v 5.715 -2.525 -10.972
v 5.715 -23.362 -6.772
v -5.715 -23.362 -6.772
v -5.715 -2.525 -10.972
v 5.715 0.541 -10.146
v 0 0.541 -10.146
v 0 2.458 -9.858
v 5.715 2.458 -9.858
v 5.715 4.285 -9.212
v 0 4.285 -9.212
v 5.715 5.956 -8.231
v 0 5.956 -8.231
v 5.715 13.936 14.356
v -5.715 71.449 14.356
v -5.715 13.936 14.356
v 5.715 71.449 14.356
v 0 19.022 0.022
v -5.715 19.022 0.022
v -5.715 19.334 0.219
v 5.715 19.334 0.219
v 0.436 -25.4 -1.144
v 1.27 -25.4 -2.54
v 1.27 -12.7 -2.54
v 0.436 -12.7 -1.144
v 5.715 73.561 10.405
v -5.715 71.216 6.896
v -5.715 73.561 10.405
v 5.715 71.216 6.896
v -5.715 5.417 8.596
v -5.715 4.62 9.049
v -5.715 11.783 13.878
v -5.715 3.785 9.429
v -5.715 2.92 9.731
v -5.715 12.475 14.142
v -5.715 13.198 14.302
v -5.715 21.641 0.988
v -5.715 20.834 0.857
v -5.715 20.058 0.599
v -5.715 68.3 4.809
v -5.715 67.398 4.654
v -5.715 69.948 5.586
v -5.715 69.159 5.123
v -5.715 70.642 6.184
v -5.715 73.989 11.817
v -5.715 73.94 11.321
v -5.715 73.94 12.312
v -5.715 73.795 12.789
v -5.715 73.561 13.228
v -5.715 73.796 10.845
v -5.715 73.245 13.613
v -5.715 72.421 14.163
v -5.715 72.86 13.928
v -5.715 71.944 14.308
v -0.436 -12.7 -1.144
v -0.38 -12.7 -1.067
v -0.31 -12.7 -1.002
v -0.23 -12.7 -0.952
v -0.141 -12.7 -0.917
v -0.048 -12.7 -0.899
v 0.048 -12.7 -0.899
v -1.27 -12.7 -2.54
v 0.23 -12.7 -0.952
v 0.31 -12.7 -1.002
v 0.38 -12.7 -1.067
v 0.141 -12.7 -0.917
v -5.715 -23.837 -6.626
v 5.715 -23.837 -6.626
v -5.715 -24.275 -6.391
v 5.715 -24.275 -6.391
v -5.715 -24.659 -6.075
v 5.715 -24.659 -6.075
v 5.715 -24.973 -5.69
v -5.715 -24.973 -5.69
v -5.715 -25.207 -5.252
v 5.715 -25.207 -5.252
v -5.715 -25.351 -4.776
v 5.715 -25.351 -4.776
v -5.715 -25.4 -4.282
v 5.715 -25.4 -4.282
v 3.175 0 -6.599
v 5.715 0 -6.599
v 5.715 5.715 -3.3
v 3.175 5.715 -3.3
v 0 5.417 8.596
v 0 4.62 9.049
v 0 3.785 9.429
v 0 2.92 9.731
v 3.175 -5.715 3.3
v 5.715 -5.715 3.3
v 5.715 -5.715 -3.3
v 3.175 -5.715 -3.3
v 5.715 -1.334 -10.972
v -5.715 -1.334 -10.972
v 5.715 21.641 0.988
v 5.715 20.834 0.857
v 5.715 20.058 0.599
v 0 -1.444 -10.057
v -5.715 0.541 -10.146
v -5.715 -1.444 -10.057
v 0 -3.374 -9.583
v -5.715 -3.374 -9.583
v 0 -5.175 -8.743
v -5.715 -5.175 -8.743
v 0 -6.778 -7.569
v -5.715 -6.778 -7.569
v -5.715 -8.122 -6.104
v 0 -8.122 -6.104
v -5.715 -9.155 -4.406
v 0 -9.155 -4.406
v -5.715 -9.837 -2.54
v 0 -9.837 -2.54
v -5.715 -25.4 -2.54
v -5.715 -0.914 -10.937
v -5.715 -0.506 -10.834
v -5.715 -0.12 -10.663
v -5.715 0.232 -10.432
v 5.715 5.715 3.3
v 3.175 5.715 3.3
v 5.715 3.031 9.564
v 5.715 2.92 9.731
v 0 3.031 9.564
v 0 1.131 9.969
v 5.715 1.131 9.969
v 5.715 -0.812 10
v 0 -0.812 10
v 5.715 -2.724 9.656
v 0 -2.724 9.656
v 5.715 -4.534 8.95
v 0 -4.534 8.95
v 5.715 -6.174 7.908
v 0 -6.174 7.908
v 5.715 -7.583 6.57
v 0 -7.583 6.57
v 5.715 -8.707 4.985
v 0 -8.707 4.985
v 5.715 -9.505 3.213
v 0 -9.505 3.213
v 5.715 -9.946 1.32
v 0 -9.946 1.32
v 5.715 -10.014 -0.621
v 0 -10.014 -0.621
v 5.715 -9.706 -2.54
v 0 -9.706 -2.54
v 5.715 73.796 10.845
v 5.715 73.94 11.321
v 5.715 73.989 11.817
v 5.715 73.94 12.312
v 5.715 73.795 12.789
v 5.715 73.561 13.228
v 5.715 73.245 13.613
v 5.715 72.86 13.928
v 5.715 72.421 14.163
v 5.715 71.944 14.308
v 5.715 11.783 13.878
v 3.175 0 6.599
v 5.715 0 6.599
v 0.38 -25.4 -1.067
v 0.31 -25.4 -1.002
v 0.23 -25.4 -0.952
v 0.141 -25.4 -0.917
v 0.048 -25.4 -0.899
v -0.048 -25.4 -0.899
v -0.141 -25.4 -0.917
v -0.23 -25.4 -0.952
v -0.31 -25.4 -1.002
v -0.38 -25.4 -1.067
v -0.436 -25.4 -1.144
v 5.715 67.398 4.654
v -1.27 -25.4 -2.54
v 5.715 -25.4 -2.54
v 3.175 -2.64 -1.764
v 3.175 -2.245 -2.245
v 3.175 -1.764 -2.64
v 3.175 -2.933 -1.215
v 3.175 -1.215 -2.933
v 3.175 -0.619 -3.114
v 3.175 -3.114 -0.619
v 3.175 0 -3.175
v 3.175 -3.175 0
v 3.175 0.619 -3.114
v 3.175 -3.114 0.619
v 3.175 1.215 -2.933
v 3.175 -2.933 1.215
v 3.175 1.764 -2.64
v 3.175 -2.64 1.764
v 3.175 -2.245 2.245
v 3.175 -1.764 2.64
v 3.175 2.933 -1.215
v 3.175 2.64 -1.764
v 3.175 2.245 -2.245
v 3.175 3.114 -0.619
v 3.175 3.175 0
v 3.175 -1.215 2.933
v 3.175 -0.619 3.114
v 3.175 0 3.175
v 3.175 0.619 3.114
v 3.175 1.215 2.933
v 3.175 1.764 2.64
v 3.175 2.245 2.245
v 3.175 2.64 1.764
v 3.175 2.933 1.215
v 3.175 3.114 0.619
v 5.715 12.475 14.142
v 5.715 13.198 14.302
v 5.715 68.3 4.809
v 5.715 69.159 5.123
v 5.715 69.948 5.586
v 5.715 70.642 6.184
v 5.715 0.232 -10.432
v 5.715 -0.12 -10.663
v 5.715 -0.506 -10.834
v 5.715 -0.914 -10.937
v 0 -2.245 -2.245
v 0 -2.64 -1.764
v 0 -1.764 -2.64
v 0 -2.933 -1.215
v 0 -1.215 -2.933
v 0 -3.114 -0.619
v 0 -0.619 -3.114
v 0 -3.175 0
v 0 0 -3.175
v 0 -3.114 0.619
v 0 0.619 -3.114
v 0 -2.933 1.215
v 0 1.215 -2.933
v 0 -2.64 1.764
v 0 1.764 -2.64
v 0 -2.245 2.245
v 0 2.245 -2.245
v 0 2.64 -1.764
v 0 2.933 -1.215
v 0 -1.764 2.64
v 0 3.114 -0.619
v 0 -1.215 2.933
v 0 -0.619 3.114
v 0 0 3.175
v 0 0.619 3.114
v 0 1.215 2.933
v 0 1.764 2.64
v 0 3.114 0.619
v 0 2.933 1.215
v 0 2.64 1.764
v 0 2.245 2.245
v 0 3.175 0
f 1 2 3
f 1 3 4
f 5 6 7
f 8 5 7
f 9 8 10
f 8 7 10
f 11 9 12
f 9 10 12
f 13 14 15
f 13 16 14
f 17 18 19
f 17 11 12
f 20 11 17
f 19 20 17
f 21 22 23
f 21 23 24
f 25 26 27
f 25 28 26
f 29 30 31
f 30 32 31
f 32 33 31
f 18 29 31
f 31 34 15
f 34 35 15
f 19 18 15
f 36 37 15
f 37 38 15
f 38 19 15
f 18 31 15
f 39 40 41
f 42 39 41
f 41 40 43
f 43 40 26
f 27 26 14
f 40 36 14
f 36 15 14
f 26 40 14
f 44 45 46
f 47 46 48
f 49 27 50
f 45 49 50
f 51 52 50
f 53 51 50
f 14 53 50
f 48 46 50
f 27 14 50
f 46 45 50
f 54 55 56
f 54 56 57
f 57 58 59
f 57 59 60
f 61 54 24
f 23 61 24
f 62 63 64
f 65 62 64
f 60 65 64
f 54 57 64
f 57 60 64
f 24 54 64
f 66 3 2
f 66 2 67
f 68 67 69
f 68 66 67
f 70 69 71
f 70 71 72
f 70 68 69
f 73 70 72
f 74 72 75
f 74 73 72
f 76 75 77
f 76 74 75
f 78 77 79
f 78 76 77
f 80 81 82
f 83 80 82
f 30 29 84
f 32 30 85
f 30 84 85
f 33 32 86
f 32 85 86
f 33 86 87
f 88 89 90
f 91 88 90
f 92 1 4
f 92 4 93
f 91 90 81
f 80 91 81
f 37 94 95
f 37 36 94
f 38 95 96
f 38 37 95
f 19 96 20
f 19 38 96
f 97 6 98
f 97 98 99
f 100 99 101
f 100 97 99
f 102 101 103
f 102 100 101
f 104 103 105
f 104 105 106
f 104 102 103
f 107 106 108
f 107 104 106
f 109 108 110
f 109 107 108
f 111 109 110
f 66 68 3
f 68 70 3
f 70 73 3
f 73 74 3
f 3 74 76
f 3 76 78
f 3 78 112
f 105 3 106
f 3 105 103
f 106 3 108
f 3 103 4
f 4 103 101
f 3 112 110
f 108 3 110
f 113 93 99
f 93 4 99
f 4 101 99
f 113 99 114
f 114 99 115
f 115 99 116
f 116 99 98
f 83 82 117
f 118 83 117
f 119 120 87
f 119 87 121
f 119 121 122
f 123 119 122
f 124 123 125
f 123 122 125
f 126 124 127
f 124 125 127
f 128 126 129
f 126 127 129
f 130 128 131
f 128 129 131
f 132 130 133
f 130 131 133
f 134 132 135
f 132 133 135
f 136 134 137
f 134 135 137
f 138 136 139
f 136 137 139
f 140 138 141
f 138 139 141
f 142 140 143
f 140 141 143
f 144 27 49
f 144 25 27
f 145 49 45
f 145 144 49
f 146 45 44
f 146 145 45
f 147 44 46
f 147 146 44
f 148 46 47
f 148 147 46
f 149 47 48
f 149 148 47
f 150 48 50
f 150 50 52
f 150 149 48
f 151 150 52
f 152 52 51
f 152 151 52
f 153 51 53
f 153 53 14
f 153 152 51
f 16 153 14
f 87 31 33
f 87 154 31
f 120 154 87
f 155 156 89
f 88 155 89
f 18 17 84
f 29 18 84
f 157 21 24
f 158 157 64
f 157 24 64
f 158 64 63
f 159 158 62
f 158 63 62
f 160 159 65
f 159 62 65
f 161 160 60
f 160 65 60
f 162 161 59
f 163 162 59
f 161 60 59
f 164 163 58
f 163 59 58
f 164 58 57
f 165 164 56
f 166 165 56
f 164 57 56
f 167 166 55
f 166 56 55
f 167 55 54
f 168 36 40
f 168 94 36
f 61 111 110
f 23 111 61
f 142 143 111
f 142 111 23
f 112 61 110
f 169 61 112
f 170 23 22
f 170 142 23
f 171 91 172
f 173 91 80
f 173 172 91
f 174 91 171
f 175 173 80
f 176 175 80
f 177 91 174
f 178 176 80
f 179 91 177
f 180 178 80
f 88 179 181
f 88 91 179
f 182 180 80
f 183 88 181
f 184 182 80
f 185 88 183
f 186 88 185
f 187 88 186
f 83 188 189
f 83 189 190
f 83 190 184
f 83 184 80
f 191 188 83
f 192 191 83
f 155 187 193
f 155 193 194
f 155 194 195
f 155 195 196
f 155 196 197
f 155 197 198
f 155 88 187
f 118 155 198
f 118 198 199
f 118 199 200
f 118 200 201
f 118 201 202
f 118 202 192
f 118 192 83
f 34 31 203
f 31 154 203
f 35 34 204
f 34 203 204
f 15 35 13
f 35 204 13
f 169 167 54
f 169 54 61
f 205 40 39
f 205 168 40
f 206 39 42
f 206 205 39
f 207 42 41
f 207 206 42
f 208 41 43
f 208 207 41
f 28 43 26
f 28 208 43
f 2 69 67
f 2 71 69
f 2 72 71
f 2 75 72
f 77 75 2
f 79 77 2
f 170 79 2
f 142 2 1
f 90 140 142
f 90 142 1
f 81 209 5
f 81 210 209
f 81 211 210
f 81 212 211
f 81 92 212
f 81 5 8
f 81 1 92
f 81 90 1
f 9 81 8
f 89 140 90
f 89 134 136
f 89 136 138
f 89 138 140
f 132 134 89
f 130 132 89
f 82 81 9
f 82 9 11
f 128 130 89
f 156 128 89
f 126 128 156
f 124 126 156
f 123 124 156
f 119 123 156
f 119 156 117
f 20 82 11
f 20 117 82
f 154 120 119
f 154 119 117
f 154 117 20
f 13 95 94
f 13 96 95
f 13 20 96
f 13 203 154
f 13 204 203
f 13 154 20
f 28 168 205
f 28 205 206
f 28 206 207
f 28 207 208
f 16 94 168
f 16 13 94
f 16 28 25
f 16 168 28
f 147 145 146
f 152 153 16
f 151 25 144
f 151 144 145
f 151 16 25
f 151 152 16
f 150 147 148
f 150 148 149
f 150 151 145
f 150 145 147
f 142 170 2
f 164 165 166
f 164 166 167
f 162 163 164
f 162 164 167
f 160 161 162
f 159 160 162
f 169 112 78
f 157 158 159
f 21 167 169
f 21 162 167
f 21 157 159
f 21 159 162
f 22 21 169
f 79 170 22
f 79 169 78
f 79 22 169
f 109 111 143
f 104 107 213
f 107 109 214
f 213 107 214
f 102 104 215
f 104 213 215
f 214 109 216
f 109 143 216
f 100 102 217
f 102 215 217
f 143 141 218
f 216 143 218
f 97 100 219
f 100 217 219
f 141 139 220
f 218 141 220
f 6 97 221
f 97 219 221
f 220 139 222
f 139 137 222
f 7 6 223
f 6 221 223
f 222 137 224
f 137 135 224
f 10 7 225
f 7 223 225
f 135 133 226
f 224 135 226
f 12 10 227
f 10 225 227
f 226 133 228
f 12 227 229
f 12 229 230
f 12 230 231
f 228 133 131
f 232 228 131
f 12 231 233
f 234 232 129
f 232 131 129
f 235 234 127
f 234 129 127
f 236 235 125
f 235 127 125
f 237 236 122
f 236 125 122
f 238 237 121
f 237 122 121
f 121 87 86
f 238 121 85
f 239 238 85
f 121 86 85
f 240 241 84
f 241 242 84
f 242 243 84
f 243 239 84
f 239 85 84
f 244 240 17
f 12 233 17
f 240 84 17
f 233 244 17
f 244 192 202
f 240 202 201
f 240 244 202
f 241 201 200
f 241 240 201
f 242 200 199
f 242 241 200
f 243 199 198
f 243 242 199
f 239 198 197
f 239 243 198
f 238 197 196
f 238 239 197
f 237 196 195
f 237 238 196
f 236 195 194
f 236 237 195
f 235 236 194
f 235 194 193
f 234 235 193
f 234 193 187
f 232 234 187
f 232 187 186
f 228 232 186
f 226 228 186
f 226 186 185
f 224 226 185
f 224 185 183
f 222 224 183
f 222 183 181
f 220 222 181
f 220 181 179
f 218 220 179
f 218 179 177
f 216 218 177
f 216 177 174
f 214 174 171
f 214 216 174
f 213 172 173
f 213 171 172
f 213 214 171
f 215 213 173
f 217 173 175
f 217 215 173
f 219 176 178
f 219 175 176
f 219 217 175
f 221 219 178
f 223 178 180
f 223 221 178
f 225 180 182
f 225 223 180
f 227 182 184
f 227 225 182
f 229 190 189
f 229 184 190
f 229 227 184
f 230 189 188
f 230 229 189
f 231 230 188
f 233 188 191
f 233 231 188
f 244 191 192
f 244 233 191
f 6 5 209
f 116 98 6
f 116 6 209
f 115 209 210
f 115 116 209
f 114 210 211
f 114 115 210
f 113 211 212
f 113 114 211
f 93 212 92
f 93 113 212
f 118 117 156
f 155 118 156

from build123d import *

# Parameters (mm, degrees)
F2_DEPTH     = 5.715
F3_R         = 5.08
F4_R         = 2.54
F0_R         = 3.175
F5_DEPTH     = 5.715
F7_DEPTH     = 25.4
F9_DEPTH     = 5.715
F10_T1_DEPTH = 10.4031462071
F10_T3_DEPTH = 10.4031460084
F10_T5_DEPTH = 21.8251062119
F12_DEPTH    = 12.7
F13_R        = 0.508
F15_DEPTH    = 2.54


# Not quite as in the source:
# - a fillet or chamfer that OpenCascade refuses, or shapes differently, is made with other operations: its cross-section is extruded or revolved along the edge and cut away or added


with BuildPart() as f2:
    # F1 (on Right) → F2 (new body, symmetric)
    with BuildSketch(Plane.YZ):
        Polygon((20.3924354673, 0.8880047341), (69.85, 4.8502287827), (76.2, 14.35636729), (12.8064267337, 14.35636729), (2.9200423986, 9.7313386741), (8.2383593544, 1.7451149179), (4.8682624474, -6.6303843632), (5.9557488763, -8.2313216024), align=None)
    extrude(amount=F2_DEPTH, both=True)

    # F3
    f3_edges = [f2.edges().sort_by_distance(p)[0] for p in [
        (0, 12.806427, 14.356367),
        (0, 69.85, 4.850229),
        (0, 20.392435, 0.888005),
    ]]
    fillet(f3_edges, radius=F3_R)

    # F4
    f4_edges = [f2.edges().sort_by_distance(p)[0] for p in [
        (0, 76.2, 14.356367),
    ]]
    fillet(f4_edges, radius=F4_R)

    # F0 (on Right) → F5 (join)
    with BuildSketch(Plane.YZ):
        with BuildLine():
            Line((10.16, 0), (10.033, 0))
            ThreePointArc((10.033, 0), (-1.2804712188, 9.9509538466), (-9.7061572726, -2.54))
            Line((-9.7061572726, -2.54), (-9.8373776994, -2.54))
            ThreePointArc((-9.8373776994, -2.54), (1.2802036116, -10.0790217141), (10.16, 0))
        make_face()
        Circle(F0_R, mode=Mode.SUBTRACT)
    extrude(amount=F5_DEPTH)

    # F6 (on Right) → F7 (cut)
    with BuildSketch(Plane.YZ):
        with BuildLine():
            Line((19.0573167056, 0), (5.4165862694, 8.5957078351))
            ThreePointArc((5.4165862694, 8.5957078351), (-10.1595718617, -0.0932715764), (5.5734885208, -8.4948116935))
            Line((5.5734885208, -8.4948116935), (19.0573167056, 0))
        make_face()
    extrude(amount=-F7_DEPTH, mode=Mode.SUBTRACT)

    # F8 (on Right) → F9 (join, symmetric)
    with BuildSketch(Plane.YZ):
        with BuildLine():
            Line((0.5413664183, -10.9723807834), (0.5413664183, -10.1455666378))
            ThreePointArc((0.5413664183, -10.1455666378), (-6.0054239987, -8.1951499434), (-9.8373776994, -2.54))
            Line((-9.8373776994, -2.54), (-25.4, -2.54))
            Line((-25.4, -2.54), (-25.4, -6.360667292))
            Line((-25.4, -6.360667292), (-2.5253696451, -10.9723807834))
            Line((-2.5253696451, -10.9723807834), (0.5413664183, -10.9723807834))
        make_face()
    extrude(amount=F9_DEPTH, both=True)

    # F10: fillet of radius 2.54 on 2 edges, made by hand

    # F10_s2 → F10_t1 (cut)
    with BuildSketch(Plane.YZ.offset(-10.4031461077)):
        with BuildLine():
            ThreePointArc((0.5413664183, -10.1455666378), (-0.3091706163, -10.7565034211), (-1.3338920247, -10.9723807834))
            Line((-1.3338920247, -10.9723807834), (0.5413664183, -10.9723807834))
            Line((0.5413664183, -10.9723807834), (0.5413664183, -10.1455666378))
        make_face()
    extrude(amount=F10_T1_DEPTH, mode=Mode.SUBTRACT)

    # F10_s4 → F10_t3 (cut)
    with BuildSketch(Plane.YZ.offset(9.94e-08)):
        with BuildLine():
            ThreePointArc((0.5413664183, -10.1455666378), (-0.3091706163, -10.7565034211), (-1.3338920247, -10.9723807834))
            Line((-1.3338920247, -10.9723807834), (0.5413664183, -10.9723807834))
            Line((0.5413664183, -10.9723807834), (0.5413664183, -10.1455666378))
        make_face()
    extrude(amount=F10_T3_DEPTH, mode=Mode.SUBTRACT)

    # F10_s6 → F10_t5 (cut)
    with BuildSketch(Plane.YZ.offset(-10.912553106)):
        with BuildLine():
            ThreePointArc((-23.3619846843, -6.7715479306), (-24.8255331463, -5.8904591062), (-25.4, -4.2816460496))
            Line((-25.4, -4.2816460496), (-25.4, -6.360667292))
            Line((-25.4, -6.360667292), (-23.3619846843, -6.7715479306))
        make_face()
    extrude(amount=F10_T5_DEPTH, mode=Mode.SUBTRACT)

    # F11 (on face) → F12 (join)
    with BuildSketch(Plane.XZ.offset(25.4)):
        Polygon((0, -0.4141342943), (-1.27, -2.54), (1.27, -2.54), align=None)
    extrude(amount=-F12_DEPTH)

    # F13
    f13_edges = [f2.edges().sort_by_distance(p)[0] for p in [
        (0, -19.05, -0.414134),
    ]]
    fillet(f13_edges, radius=F13_R)

    # F14 (on face) → F15 (cut)
    with BuildSketch(Plane.YZ.offset(5.715)):
        Polygon((5.715, -3.2995567884), (5.715, 3.2995567884), (0, 6.5991135768), (-5.715, 3.2995567884), (-5.715, -3.2995567884), (0, -6.5991135768), align=None)
    extrude(amount=-F15_DEPTH, mode=Mode.SUBTRACT)


solid = f2.part
